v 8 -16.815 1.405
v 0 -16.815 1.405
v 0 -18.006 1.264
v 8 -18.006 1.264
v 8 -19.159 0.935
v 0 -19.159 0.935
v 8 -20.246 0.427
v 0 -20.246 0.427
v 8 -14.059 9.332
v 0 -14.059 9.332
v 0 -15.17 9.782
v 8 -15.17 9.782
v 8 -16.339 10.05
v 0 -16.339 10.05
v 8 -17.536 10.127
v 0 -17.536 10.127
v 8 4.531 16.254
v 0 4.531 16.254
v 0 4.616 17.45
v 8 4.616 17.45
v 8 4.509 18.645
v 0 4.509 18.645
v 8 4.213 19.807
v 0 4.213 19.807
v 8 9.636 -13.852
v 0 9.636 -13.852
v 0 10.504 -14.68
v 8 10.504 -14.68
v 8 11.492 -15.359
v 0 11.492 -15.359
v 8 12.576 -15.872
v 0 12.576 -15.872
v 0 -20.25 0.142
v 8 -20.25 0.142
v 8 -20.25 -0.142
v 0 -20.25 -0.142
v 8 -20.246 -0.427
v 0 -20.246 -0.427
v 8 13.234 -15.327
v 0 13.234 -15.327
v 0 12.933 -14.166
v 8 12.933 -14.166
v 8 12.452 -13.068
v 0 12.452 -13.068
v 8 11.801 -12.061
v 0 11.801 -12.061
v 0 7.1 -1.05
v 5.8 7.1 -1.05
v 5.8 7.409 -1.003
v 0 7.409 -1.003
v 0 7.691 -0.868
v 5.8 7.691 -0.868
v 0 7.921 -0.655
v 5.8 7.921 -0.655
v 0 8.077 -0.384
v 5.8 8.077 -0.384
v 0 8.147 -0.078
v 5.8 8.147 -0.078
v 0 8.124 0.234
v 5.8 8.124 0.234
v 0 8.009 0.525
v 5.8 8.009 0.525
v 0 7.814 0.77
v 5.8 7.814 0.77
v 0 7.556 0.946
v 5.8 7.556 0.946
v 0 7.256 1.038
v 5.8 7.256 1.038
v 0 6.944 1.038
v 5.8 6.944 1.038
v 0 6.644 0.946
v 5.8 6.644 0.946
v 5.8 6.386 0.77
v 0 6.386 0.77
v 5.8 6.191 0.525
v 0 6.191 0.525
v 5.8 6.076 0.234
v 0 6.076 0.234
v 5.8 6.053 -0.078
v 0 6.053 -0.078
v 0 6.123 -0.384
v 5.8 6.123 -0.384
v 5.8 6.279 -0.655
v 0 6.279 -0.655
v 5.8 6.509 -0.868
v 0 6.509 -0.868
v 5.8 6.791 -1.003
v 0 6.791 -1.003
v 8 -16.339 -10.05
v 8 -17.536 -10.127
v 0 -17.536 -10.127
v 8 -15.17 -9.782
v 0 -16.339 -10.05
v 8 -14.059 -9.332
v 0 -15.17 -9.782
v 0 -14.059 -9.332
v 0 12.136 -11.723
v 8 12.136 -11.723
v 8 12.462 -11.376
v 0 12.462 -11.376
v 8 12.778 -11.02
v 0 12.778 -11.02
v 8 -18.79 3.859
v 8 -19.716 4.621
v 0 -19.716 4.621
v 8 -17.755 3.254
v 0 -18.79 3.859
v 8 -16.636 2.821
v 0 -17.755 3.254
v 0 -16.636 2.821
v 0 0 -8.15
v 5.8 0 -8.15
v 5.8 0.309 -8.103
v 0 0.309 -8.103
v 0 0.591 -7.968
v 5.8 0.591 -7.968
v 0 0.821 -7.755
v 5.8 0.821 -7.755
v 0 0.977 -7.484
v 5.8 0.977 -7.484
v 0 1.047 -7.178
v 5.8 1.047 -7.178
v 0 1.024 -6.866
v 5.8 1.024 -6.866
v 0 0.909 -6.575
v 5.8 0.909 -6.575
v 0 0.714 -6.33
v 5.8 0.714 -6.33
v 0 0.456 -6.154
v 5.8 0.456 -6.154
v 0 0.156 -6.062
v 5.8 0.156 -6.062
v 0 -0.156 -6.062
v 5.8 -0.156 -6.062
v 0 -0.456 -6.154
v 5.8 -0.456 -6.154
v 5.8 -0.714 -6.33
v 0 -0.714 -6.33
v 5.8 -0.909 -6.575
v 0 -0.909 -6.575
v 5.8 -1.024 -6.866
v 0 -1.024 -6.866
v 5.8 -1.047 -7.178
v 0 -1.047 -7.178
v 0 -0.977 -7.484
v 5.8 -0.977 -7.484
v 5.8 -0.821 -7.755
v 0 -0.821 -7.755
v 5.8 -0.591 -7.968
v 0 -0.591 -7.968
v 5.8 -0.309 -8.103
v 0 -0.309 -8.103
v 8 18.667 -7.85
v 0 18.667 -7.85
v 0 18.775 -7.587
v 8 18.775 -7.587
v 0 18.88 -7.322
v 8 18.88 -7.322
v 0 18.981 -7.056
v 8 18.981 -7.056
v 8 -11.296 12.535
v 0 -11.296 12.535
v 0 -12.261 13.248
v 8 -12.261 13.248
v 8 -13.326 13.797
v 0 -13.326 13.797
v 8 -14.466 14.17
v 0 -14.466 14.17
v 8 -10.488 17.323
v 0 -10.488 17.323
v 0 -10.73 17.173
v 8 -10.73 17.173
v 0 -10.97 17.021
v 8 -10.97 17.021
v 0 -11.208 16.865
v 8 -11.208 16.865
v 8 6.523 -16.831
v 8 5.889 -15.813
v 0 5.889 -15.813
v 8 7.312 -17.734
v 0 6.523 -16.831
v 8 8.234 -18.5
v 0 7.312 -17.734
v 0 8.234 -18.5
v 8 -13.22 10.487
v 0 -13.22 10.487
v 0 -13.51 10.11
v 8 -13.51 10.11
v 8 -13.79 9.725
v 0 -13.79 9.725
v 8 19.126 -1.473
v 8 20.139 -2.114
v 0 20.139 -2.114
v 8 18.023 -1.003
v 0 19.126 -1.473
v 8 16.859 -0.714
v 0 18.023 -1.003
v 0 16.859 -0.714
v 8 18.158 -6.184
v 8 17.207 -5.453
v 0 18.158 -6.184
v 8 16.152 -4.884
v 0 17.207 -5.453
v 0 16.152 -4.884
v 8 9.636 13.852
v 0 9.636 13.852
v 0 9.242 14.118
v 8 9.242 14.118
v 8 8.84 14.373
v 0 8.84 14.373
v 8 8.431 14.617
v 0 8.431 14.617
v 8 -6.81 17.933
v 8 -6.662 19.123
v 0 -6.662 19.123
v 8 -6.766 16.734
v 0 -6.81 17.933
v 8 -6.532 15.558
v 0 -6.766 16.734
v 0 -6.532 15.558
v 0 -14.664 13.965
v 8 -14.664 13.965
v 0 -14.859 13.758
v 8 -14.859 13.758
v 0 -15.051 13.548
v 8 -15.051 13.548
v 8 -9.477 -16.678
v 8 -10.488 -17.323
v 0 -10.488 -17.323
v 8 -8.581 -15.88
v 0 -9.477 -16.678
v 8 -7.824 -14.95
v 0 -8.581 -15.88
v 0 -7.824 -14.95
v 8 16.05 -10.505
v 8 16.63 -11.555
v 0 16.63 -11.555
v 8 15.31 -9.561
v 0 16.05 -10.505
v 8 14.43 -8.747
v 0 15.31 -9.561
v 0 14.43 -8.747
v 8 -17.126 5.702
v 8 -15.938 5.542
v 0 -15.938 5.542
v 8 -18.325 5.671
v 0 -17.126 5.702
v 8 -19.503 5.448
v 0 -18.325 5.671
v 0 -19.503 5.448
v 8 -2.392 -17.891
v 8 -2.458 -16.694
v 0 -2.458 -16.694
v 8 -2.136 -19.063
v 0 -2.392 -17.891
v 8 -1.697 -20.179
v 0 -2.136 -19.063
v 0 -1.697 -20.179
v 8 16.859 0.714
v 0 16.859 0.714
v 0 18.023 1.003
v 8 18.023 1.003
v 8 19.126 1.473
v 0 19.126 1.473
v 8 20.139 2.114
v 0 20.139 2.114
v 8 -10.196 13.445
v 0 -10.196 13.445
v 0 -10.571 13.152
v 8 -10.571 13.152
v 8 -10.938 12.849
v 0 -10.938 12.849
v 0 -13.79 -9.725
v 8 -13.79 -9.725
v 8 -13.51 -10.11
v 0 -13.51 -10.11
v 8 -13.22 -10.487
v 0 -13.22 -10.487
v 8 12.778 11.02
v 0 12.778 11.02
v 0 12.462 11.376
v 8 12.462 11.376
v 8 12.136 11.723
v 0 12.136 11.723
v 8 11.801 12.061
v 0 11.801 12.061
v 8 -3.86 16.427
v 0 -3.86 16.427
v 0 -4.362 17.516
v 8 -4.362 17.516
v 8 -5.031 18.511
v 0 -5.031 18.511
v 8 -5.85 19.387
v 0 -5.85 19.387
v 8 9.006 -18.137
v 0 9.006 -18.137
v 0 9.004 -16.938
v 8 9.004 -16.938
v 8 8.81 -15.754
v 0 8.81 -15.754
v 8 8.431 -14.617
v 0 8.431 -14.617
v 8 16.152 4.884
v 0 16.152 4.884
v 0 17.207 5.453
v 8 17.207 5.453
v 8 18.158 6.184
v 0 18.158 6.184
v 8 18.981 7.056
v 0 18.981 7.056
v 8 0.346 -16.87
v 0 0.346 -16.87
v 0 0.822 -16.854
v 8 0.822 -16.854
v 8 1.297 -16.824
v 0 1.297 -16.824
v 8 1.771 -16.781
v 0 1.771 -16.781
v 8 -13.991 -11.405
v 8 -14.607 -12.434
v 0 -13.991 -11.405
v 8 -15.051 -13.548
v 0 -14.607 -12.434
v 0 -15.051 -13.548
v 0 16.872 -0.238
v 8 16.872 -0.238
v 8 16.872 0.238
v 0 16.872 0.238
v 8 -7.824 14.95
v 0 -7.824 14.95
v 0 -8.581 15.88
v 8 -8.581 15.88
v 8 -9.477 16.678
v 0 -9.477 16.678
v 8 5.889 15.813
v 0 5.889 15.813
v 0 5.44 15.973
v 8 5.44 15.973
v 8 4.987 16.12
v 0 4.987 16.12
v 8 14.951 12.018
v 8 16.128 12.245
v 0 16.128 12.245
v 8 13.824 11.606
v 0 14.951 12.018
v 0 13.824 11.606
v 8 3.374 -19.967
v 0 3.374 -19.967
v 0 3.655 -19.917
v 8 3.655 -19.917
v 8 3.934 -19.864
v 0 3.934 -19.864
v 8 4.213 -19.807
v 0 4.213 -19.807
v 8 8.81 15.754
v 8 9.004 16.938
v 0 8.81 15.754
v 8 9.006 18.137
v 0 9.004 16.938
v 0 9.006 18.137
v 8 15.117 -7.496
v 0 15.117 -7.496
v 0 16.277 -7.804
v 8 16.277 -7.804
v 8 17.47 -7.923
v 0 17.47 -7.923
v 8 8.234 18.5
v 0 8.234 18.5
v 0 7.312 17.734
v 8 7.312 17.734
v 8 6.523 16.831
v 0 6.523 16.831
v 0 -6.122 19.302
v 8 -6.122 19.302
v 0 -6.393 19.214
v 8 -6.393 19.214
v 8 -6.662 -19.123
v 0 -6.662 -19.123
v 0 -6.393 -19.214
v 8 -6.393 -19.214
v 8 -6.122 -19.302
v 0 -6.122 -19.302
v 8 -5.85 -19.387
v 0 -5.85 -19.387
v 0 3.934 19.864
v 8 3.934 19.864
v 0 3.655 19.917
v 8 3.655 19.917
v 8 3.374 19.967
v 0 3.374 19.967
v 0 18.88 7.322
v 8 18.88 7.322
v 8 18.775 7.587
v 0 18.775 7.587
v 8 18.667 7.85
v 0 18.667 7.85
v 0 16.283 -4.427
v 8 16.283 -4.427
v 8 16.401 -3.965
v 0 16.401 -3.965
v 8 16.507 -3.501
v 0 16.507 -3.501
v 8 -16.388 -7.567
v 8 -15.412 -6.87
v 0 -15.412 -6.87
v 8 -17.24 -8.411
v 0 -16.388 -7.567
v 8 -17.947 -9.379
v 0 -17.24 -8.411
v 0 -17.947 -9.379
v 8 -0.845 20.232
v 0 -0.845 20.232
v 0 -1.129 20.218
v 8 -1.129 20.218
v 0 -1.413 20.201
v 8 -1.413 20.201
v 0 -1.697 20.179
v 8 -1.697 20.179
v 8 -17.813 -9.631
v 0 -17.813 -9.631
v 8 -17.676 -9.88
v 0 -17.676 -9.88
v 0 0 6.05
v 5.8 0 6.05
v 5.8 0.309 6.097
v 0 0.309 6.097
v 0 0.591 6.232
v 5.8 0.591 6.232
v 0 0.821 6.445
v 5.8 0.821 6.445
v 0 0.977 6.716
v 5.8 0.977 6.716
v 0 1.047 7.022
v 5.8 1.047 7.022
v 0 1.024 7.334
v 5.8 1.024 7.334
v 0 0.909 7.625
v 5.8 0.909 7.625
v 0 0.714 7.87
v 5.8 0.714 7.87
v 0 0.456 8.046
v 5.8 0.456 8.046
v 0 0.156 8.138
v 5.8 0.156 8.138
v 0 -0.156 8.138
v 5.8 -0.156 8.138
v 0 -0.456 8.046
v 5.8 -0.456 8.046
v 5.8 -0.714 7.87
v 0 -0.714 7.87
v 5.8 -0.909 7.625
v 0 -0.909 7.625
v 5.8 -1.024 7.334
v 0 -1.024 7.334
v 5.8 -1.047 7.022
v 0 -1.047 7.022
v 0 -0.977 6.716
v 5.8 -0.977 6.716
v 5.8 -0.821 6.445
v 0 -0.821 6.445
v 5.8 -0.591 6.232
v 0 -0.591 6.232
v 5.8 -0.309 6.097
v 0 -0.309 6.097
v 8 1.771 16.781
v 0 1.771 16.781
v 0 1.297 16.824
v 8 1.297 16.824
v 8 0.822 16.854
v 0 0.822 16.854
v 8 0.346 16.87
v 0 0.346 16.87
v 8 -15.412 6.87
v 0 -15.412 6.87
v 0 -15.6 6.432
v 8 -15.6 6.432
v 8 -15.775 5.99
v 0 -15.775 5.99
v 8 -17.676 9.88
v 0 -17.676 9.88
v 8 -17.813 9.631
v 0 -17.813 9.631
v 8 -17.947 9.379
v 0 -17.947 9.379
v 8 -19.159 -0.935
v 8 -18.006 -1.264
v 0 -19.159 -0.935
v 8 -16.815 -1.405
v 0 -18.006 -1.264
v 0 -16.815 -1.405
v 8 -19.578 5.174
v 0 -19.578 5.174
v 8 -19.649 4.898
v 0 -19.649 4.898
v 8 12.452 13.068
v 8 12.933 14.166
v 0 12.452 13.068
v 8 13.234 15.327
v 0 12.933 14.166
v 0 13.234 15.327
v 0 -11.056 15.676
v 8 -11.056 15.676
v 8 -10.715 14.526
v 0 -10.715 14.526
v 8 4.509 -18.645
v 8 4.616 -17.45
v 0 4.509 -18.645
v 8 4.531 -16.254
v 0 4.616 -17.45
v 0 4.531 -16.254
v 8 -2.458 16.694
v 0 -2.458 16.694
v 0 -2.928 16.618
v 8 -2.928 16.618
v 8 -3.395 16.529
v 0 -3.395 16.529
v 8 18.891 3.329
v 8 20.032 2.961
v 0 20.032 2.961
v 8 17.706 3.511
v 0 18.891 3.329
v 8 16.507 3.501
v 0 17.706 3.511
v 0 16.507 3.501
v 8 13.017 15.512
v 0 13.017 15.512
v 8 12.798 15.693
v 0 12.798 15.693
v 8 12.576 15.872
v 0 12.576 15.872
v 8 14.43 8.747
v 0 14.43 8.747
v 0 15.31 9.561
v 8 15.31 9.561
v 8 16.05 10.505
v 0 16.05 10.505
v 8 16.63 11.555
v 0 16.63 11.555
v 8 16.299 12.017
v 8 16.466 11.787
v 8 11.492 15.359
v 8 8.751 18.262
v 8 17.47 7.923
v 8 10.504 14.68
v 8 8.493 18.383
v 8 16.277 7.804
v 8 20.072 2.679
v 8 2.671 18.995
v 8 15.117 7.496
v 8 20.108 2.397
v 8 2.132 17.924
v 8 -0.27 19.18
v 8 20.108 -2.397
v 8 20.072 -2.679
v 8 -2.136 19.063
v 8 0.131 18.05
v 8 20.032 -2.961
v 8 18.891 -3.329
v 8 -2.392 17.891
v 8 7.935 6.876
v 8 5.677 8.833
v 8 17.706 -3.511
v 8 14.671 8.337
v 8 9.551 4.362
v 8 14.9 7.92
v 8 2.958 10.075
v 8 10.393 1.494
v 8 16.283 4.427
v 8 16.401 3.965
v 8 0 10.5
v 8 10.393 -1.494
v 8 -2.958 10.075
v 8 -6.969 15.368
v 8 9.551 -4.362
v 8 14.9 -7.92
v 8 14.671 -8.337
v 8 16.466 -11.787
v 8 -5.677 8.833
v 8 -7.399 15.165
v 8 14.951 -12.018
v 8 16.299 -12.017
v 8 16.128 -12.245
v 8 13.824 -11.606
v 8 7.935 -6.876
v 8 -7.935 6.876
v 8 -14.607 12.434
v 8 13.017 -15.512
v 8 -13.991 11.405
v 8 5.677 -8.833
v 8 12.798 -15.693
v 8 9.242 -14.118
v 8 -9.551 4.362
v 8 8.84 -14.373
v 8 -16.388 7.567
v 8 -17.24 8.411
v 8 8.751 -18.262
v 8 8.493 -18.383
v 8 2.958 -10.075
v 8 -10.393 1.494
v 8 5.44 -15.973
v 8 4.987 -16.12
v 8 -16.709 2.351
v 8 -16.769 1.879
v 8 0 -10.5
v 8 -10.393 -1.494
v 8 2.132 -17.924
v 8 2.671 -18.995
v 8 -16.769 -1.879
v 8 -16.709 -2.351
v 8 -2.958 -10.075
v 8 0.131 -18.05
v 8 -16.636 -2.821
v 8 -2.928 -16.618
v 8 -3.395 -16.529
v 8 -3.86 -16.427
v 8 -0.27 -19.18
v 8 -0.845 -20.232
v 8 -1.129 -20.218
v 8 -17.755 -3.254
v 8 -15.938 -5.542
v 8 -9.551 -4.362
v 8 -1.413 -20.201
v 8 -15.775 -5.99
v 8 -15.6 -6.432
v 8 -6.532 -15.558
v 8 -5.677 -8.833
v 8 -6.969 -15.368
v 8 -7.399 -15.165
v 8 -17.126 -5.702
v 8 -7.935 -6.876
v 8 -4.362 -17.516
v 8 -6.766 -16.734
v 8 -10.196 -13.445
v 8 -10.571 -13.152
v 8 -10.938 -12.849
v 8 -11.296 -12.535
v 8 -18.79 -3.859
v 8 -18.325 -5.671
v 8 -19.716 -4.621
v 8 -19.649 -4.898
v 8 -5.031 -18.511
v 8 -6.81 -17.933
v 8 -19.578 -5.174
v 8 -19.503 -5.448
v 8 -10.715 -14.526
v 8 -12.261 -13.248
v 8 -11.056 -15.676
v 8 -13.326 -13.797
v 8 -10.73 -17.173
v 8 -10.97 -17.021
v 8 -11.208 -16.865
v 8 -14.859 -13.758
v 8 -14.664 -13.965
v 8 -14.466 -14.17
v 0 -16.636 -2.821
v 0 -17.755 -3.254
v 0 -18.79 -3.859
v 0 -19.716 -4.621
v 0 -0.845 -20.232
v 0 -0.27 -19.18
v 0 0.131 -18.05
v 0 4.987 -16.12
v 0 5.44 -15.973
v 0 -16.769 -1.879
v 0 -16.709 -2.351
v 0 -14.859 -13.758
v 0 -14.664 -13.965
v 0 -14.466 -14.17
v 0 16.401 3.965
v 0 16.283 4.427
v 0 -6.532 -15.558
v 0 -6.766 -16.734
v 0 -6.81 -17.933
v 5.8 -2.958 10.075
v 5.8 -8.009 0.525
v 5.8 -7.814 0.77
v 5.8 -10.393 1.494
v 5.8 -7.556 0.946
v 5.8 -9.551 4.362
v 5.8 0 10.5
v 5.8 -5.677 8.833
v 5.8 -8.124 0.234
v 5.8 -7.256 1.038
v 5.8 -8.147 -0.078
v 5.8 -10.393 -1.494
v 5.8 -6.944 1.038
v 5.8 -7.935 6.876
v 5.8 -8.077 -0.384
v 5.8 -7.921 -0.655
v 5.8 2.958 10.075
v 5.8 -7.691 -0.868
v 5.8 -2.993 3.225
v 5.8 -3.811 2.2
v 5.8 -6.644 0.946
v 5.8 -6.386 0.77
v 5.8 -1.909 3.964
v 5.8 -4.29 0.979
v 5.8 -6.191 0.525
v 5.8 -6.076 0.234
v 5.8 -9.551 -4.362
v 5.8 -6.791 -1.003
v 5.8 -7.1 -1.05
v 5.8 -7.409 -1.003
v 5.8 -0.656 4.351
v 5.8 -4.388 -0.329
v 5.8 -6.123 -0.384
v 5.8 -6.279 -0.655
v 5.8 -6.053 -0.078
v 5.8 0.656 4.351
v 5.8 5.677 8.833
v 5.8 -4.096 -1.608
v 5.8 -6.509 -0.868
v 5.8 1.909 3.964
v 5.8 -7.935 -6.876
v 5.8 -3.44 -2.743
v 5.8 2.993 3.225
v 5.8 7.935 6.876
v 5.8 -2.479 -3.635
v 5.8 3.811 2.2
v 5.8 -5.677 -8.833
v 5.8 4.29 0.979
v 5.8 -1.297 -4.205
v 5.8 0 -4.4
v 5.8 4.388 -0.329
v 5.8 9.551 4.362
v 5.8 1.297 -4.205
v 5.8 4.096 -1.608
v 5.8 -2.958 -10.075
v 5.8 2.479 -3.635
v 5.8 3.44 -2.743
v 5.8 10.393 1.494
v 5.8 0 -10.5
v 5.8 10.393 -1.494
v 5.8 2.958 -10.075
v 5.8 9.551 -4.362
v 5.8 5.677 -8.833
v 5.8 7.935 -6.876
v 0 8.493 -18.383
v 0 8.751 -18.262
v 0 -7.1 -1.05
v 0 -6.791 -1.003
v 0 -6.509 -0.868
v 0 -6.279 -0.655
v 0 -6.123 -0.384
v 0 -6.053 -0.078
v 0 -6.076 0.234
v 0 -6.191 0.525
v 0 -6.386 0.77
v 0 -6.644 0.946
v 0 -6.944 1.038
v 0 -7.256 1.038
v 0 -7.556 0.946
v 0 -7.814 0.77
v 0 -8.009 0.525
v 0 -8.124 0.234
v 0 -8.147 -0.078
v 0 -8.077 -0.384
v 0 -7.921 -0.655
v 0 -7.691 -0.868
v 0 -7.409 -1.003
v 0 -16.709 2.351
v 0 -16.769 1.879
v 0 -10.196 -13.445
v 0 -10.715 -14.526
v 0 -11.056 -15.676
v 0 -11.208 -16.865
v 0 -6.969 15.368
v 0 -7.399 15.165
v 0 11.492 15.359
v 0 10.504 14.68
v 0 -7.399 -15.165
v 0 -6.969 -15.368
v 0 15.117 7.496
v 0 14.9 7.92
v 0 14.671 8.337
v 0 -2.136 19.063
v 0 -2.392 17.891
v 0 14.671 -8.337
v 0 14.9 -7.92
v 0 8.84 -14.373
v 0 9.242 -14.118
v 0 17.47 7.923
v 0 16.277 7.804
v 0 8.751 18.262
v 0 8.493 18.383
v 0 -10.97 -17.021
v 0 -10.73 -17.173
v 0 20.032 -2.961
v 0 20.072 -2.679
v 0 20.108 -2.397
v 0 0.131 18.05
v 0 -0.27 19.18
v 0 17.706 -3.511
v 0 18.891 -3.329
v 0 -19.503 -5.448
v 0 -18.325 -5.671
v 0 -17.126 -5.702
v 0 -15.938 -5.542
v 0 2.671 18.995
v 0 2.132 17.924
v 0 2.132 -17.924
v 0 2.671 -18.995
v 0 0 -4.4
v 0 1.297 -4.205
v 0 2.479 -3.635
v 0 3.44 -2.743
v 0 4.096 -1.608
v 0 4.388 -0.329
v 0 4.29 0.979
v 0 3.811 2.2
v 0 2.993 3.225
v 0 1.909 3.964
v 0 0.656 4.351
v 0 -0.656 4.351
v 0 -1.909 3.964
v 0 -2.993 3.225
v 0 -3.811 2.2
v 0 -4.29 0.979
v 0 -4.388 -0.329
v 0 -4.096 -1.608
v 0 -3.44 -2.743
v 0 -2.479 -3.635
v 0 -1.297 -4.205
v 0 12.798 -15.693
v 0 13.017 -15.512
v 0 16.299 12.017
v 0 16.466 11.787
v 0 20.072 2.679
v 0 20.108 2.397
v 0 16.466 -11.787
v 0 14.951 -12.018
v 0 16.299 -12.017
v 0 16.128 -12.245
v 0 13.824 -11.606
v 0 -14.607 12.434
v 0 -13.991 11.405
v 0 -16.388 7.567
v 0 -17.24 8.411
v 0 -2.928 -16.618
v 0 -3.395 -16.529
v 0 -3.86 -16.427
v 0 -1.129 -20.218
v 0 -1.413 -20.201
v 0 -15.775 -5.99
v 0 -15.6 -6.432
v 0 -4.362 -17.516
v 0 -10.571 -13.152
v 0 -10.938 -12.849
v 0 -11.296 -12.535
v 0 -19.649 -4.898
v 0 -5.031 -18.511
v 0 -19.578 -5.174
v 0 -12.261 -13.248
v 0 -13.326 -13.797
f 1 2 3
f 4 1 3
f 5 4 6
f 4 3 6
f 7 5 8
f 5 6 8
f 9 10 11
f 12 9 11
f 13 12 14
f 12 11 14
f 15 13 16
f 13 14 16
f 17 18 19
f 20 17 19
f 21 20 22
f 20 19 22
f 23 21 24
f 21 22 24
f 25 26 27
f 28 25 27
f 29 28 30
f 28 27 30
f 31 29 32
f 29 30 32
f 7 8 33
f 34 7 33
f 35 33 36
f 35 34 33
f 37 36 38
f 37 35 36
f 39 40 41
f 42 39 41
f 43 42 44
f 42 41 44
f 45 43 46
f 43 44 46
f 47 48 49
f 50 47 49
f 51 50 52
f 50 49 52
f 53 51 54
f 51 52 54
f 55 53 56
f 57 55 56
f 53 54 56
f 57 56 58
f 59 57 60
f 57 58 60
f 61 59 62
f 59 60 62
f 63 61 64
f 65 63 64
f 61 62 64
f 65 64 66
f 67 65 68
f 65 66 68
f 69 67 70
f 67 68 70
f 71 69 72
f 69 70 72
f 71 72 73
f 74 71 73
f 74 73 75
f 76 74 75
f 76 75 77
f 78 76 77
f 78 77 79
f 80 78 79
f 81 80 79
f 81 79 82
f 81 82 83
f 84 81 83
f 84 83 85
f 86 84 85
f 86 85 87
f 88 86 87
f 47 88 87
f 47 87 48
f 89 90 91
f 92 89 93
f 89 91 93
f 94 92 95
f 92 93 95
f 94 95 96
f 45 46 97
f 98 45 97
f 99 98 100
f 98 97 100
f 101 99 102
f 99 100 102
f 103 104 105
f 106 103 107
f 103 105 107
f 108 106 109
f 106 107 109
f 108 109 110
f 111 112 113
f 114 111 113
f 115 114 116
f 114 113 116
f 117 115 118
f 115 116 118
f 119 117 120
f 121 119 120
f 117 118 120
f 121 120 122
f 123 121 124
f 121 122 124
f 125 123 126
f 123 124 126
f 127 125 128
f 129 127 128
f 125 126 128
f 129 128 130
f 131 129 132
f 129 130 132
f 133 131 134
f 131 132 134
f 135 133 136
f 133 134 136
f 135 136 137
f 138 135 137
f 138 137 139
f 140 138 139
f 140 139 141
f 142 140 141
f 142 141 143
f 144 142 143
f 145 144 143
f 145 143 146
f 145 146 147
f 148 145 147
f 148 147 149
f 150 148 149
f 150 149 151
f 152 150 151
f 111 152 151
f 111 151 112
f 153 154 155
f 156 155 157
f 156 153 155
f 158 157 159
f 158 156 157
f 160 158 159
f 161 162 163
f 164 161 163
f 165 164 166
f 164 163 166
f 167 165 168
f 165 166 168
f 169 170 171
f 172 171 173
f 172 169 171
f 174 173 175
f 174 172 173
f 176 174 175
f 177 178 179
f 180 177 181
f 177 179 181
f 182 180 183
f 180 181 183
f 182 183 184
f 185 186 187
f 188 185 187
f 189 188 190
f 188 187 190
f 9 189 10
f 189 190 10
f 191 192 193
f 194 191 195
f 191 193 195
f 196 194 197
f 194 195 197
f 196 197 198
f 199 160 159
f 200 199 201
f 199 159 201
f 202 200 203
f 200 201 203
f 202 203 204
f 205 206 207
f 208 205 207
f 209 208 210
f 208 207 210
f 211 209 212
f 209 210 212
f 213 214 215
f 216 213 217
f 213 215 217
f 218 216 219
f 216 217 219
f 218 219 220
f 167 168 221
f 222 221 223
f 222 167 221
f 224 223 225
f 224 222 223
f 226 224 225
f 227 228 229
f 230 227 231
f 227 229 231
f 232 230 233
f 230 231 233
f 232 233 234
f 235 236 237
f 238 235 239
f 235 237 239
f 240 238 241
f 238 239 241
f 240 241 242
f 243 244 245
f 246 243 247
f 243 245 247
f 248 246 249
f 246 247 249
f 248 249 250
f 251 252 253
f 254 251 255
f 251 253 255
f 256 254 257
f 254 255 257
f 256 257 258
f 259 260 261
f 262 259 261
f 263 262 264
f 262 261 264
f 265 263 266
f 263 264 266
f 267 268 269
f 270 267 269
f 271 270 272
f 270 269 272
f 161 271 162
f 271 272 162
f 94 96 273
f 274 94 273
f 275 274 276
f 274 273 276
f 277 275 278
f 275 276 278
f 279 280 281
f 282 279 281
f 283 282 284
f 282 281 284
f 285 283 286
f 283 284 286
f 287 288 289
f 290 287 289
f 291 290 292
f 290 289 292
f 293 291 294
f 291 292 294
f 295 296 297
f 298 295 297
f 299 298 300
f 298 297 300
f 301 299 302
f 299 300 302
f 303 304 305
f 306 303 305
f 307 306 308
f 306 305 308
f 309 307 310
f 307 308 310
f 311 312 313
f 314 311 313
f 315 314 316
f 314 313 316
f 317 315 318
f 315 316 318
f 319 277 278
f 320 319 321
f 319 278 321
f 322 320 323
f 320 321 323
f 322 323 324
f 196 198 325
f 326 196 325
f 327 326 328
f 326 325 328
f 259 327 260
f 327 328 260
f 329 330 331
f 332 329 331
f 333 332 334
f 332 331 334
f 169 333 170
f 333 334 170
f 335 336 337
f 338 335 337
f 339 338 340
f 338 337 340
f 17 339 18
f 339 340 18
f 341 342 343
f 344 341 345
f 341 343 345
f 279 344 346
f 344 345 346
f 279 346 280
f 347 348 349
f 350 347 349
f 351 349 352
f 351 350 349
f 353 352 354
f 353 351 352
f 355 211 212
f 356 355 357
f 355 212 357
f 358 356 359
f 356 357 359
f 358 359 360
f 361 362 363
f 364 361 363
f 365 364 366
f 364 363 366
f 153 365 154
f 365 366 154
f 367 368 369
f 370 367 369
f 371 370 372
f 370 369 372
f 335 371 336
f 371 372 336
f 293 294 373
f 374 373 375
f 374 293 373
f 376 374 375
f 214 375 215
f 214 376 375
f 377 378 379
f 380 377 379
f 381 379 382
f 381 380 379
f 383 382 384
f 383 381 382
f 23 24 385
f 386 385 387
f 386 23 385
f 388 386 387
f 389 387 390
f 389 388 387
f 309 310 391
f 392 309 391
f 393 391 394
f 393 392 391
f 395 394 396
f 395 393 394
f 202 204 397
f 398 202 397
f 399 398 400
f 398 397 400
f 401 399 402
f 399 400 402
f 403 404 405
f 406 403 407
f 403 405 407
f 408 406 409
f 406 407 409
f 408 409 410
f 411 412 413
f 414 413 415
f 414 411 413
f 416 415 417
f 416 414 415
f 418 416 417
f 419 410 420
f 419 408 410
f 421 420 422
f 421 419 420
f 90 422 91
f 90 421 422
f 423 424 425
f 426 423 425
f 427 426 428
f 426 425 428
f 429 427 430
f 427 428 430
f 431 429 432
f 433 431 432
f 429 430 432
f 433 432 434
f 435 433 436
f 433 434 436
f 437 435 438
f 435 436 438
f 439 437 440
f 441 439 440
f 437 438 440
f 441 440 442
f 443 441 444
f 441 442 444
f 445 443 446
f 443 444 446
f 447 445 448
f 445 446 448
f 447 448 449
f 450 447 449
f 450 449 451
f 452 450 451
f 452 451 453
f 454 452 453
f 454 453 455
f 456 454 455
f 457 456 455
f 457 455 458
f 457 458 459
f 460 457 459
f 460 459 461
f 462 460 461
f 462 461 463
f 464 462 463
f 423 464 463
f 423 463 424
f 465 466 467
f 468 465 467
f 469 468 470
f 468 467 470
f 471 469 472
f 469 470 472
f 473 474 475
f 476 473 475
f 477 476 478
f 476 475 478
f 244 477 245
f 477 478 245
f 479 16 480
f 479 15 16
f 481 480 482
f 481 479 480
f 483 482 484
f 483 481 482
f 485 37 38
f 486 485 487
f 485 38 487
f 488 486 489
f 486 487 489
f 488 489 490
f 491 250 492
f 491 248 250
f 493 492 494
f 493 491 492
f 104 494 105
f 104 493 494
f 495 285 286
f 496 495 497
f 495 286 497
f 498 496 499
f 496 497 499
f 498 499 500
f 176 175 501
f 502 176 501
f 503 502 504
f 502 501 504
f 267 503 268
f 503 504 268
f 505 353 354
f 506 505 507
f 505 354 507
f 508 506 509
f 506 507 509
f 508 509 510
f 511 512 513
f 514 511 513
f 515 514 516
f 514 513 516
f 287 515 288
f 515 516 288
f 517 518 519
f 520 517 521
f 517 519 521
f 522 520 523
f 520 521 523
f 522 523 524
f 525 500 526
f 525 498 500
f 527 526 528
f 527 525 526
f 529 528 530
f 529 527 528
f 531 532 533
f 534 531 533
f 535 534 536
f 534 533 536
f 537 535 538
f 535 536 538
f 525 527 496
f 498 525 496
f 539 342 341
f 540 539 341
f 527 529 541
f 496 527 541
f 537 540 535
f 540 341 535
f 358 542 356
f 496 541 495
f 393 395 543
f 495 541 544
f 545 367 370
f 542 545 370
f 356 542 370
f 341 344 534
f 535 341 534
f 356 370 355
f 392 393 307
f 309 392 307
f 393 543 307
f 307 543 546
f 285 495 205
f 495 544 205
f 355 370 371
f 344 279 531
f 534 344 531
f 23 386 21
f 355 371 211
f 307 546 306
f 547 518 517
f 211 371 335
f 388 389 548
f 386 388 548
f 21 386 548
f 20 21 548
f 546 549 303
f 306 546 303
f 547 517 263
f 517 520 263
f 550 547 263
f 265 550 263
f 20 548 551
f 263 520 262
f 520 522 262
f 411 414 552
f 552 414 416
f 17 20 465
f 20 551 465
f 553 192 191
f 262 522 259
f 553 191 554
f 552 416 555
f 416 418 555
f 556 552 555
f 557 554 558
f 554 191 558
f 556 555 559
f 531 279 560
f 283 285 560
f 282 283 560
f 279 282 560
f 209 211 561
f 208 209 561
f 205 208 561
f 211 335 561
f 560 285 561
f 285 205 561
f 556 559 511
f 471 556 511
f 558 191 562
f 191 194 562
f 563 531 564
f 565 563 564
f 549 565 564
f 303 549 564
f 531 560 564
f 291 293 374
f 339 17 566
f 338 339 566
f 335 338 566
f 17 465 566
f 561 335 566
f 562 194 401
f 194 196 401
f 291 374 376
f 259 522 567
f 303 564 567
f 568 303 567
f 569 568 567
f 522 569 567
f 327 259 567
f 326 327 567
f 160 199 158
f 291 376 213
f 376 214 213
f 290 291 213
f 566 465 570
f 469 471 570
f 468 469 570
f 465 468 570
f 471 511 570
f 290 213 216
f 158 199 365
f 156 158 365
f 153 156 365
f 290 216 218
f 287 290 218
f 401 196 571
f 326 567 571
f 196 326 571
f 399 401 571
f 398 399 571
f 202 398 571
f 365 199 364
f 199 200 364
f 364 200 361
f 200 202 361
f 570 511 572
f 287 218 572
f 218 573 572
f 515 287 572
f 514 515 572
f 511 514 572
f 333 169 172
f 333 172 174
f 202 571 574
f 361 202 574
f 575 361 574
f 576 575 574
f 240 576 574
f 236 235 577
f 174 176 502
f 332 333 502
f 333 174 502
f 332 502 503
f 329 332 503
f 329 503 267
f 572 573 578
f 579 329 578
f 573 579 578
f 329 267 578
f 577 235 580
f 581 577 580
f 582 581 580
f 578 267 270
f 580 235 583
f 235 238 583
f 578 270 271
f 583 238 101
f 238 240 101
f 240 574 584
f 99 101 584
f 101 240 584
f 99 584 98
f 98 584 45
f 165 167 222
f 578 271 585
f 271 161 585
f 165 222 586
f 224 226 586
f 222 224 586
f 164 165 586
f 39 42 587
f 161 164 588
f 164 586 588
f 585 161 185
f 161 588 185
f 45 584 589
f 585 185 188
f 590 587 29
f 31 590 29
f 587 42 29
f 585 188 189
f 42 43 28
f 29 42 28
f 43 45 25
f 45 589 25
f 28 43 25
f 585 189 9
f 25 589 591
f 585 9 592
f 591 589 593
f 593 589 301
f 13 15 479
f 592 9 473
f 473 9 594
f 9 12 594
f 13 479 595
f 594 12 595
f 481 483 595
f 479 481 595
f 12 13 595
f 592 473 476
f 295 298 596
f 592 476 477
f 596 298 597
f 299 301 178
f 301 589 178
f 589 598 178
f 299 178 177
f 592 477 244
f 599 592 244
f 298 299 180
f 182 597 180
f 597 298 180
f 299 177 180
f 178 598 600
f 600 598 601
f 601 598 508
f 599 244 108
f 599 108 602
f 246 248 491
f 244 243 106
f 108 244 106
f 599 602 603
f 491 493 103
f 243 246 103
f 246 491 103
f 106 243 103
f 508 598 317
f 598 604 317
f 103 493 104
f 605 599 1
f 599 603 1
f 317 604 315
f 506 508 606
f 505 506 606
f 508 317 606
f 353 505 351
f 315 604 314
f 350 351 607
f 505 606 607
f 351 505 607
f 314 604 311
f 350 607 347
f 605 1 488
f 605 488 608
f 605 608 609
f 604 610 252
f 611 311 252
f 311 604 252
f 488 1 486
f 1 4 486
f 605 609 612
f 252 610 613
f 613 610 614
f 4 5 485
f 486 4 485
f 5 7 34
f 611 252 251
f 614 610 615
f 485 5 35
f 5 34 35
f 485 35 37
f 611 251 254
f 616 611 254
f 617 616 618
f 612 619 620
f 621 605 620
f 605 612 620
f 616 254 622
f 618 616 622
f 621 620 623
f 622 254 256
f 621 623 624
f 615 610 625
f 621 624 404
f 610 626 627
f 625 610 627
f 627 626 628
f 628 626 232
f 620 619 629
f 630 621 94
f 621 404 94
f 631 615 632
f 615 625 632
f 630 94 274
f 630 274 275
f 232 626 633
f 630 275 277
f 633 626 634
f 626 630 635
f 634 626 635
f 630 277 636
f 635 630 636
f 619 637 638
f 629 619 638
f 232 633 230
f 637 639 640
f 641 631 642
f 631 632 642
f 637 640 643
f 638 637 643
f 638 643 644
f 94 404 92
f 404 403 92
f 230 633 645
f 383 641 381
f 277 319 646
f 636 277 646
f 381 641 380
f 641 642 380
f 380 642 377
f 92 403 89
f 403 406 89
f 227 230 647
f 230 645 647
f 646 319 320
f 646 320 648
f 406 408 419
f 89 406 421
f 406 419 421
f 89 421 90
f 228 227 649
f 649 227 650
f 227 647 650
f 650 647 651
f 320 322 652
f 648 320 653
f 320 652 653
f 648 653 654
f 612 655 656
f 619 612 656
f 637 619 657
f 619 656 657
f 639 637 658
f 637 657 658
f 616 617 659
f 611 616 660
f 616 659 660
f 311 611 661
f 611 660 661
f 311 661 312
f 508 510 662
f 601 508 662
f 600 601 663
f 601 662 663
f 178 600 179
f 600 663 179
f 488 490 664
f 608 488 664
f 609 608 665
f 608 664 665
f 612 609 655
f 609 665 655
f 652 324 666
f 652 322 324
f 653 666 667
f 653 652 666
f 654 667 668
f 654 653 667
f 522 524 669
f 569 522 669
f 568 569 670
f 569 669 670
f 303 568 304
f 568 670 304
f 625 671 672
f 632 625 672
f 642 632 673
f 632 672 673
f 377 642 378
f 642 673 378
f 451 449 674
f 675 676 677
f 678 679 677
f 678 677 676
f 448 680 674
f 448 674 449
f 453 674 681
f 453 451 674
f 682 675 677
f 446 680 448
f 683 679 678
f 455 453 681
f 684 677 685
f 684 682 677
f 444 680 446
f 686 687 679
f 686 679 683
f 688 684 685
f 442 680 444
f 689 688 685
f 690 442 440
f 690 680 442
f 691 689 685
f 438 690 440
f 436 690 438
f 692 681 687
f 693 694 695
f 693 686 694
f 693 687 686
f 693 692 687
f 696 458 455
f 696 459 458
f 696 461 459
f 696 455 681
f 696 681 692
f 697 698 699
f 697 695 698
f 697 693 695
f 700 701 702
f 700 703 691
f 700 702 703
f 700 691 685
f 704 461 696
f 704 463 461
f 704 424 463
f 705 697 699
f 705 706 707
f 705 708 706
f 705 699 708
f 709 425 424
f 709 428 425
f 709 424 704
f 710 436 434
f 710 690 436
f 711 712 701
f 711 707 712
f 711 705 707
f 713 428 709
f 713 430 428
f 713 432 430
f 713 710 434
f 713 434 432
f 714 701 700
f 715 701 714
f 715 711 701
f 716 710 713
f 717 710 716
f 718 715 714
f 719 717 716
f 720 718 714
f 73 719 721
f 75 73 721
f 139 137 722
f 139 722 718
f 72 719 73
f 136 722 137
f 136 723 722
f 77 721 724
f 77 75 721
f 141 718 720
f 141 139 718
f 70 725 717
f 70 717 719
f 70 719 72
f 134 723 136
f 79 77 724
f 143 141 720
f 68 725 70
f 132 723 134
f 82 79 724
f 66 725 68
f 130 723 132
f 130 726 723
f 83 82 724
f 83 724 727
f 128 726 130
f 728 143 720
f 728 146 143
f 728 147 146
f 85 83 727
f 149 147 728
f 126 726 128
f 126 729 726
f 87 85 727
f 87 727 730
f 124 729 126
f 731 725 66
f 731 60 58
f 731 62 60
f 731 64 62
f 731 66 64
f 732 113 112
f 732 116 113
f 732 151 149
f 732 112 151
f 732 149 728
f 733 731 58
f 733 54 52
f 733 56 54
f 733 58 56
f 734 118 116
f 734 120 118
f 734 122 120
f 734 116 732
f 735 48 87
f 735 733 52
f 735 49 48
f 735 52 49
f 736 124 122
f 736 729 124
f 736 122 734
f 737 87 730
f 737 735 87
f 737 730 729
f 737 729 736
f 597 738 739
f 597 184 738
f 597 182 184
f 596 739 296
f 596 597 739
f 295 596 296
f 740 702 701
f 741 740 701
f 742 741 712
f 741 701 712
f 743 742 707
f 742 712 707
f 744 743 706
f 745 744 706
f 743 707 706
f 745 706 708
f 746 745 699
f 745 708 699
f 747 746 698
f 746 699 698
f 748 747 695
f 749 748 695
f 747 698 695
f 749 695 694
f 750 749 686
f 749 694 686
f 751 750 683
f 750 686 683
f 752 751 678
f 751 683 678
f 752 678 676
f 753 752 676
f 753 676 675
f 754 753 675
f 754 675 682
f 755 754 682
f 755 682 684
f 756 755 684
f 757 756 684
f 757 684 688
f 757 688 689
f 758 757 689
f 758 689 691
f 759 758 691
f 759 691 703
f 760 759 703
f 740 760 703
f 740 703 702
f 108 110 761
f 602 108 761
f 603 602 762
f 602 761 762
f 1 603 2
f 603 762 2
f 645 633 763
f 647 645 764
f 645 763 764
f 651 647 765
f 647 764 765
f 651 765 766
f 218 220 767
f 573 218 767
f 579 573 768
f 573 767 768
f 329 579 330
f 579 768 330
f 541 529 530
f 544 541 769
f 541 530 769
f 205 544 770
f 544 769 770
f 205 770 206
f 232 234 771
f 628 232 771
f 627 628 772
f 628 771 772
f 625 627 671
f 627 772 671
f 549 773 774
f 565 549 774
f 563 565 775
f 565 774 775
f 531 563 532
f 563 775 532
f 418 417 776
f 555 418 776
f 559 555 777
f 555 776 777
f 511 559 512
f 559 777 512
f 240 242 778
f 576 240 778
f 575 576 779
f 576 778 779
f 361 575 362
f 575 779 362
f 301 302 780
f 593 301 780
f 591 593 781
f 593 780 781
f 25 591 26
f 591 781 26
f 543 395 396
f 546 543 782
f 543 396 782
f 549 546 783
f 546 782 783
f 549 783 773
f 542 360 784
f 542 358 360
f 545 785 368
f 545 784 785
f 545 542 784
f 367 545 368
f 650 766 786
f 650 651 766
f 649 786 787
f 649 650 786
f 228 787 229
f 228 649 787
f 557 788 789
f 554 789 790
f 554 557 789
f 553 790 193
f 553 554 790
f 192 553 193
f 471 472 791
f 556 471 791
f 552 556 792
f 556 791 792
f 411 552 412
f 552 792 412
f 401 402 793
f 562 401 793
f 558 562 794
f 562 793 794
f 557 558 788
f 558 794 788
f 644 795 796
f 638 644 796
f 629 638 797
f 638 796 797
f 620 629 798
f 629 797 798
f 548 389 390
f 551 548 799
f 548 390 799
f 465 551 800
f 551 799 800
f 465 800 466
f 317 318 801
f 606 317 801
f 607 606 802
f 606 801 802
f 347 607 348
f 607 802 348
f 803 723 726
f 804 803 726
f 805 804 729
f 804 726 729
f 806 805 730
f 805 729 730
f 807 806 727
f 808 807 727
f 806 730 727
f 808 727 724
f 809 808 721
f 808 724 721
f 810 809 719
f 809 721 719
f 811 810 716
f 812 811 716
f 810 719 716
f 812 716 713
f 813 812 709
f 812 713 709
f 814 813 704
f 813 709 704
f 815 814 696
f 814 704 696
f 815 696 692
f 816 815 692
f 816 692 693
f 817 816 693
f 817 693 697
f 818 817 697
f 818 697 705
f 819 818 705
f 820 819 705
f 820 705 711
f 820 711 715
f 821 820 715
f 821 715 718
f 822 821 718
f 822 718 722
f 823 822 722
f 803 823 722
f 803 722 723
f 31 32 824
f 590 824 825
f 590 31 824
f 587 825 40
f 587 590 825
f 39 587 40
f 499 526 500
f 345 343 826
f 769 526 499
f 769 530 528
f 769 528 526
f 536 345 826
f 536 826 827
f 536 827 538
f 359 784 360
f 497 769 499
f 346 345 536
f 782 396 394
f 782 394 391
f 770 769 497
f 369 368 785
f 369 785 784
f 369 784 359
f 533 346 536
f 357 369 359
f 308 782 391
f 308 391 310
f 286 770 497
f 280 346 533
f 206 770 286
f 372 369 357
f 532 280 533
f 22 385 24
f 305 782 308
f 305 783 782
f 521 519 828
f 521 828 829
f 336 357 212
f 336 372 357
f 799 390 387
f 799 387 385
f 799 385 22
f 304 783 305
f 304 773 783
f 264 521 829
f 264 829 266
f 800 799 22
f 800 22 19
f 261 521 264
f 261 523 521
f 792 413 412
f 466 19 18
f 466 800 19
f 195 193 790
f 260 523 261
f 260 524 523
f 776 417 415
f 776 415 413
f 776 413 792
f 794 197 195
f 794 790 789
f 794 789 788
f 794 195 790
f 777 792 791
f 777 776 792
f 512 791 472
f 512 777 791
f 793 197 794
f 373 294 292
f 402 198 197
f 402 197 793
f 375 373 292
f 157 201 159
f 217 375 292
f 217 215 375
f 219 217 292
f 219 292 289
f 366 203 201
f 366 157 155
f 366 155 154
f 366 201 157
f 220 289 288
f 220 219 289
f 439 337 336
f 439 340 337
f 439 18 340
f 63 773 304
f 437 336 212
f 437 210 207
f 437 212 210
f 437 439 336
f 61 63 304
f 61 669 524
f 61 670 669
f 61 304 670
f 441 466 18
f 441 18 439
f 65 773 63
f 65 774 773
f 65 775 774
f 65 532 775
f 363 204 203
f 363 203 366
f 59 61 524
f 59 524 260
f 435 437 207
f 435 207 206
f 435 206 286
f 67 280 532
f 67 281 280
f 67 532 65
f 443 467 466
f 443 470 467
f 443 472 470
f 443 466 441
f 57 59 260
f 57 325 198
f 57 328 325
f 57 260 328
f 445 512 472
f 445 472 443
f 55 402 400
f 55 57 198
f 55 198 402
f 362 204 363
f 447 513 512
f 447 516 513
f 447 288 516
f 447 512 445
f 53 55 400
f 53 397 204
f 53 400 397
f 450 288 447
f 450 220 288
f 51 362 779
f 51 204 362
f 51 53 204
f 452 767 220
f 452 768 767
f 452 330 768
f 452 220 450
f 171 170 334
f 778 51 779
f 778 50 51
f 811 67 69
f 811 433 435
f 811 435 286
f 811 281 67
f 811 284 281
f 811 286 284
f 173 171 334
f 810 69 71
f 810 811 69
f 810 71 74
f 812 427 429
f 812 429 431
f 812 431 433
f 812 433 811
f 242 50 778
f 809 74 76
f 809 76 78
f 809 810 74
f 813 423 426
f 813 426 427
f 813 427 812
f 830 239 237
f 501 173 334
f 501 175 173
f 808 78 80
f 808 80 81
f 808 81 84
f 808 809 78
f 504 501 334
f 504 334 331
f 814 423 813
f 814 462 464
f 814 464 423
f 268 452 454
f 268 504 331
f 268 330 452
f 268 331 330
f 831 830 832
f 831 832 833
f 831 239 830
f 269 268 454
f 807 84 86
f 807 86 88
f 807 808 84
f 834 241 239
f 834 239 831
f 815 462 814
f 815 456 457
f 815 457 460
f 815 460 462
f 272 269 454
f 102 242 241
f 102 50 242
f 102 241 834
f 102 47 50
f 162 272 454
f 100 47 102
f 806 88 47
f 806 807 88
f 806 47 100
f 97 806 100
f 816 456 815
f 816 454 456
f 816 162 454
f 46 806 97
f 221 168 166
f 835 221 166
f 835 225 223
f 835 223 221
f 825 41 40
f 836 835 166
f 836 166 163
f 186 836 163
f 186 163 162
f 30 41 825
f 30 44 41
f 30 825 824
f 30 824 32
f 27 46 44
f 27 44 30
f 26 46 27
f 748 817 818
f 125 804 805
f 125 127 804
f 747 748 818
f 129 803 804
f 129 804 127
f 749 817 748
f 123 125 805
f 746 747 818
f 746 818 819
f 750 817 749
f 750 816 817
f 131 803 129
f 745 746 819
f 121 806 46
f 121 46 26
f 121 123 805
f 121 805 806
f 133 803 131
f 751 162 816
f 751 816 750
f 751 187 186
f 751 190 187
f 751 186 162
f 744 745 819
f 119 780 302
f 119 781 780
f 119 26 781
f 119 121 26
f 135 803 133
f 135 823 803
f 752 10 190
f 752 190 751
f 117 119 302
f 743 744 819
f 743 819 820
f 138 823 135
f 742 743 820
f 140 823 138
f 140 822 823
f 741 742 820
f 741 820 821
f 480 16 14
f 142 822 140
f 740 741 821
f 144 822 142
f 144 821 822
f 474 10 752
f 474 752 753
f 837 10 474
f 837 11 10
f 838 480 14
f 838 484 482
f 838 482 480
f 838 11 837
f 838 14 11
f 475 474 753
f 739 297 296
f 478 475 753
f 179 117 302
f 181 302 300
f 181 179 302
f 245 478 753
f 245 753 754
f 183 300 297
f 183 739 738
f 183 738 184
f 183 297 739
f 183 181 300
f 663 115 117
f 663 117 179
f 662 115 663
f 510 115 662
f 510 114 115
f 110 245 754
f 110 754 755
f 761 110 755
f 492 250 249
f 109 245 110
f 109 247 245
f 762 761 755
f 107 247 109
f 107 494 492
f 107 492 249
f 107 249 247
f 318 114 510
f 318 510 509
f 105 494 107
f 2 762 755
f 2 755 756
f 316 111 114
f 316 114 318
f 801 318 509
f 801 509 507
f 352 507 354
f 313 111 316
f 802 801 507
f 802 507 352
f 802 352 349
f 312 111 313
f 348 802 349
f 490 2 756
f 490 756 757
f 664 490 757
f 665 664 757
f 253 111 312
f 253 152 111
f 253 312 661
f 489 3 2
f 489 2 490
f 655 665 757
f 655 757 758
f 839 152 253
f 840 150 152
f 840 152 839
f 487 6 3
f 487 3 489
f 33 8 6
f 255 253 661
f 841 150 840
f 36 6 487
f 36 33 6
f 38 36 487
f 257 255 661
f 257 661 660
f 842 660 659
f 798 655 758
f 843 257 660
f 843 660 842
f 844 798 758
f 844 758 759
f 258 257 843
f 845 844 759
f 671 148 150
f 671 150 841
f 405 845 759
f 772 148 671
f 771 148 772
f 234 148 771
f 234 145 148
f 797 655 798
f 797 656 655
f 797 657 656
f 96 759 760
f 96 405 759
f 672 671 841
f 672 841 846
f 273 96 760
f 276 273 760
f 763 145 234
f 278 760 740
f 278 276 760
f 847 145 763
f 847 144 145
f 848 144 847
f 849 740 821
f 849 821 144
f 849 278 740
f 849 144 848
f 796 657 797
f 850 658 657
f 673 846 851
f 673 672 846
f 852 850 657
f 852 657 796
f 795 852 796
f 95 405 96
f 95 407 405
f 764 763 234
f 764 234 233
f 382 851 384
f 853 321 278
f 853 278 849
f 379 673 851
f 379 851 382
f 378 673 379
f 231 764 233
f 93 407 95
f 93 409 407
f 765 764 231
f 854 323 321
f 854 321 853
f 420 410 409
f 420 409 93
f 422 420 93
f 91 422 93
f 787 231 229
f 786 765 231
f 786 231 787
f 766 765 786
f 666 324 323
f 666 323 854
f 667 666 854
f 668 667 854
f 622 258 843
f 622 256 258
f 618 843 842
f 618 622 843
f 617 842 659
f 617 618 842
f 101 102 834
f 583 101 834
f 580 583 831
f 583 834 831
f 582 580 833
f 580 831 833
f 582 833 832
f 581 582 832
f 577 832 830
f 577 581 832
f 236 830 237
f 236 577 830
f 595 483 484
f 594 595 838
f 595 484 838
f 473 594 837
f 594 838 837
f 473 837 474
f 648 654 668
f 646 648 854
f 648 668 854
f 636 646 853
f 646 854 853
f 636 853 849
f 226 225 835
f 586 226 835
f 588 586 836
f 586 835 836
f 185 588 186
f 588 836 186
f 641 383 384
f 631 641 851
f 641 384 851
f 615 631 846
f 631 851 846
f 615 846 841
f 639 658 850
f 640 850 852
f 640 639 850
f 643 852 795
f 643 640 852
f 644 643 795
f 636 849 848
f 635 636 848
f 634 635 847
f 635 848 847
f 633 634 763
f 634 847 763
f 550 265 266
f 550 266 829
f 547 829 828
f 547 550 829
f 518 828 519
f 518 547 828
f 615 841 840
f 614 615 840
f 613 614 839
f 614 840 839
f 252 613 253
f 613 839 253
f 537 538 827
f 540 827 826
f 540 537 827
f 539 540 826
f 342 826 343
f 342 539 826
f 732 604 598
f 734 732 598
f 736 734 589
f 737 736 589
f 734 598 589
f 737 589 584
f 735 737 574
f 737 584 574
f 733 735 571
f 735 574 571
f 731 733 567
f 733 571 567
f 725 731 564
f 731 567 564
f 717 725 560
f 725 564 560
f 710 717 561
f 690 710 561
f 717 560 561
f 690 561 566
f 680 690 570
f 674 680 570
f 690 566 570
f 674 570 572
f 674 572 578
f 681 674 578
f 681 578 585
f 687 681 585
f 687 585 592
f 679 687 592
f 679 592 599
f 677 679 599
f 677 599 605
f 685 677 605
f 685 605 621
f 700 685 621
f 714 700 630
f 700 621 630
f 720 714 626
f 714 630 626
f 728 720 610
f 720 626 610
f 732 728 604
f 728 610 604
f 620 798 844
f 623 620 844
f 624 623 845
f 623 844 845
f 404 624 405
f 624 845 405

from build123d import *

# Parameters (mm, degrees)
BASPROSKE_W         = 8
BASPROSKE_H         = 20.25
TOOTHCUT_DEPTH      = 30.734239523
TEETHCUTS_COUNT     = 25
TEETHCUTS_ANGLE     = 345.6
BORSKE_R            = 0.5
BORE_DEPTH          = 50.0000508
SKETCH_1_R          = 10.5
CUT_EXTRUDE_1_DEPTH = 2.2
SKETCH_2_R          = 4.4
SKETCH_2_R_2        = 1.05
CUT_EXTRUDE_2_DEPTH = 30.207030593


with BuildPart() as part:
    # BasProSke → Base-Revolve (revolve)
    with BuildSketch(Plane(origin=(0, 0, 0), x_dir=(1, 0, 0), z_dir=(0, 1, 0))):
        with Locations((4, 10.125)):
            Rectangle(BASPROSKE_W, BASPROSKE_H)
    revolve(axis=Axis((-10, 0, 0), (1, 0, 0)))

    # TooCutSke → ToothCut (cut, through all)
    with BuildSketch(Plane(origin=(0, 0, 0), x_dir=(0, 0, -1), z_dir=(1, 0, 0))):
        with BuildLine():
            ThreePointArc((0.713909619, 16.858891098), (0, 16.874), (-0.713909619, 16.858891098))
            ThreePointArc((-0.713909619, 16.858891098), (-1.221902209, 18.597177626), (-2.131751691, 20.163022588))
            ThreePointArc((-2.131751691, 20.163022588), (0, 20.2754), (2.131751691, 20.163022588))
            ThreePointArc((2.131751691, 20.163022588), (1.221902209, 18.597177626), (0.713909619, 16.858891098))
        make_face()
    toothcut = extrude(amount=TOOTHCUT_DEPTH, mode=Mode.SUBTRACT)

    # TeethCuts: ToothCut ×25 about axis
    teethcuts_axis = Axis((-10, 0, 0), (1, 0, 0))
    for i in range(1, TEETHCUTS_COUNT):
        add(toothcut.rotate(teethcuts_axis, i * TEETHCUTS_ANGLE / (TEETHCUTS_COUNT - 1)), mode=Mode.SUBTRACT)

    # BorSke → Bore (cut, symmetric)
    with BuildSketch(Plane(origin=(0, 0, 0), x_dir=(0, 0, -1), z_dir=(1, 0, 0))):
        Circle(BORSKE_R)
    extrude(amount=BORE_DEPTH, both=True, mode=Mode.SUBTRACT)

    # 草图1 → 切除-拉伸1 (cut)
    with BuildSketch(Plane(origin=(8, 0, 0), x_dir=(0, 0, -1), z_dir=(1, 0, 0))):
        Circle(SKETCH_1_R)
    extrude(amount=-CUT_EXTRUDE_1_DEPTH, mode=Mode.SUBTRACT)

    # 草图2 → 切除-拉伸2 (cut, through all)
    with BuildSketch(Plane(origin=(5.8, 0, 0), x_dir=(0, 0, -1), z_dir=(1, 0, 0))):
        Circle(SKETCH_2_R)
        with Locations((0, 7.1)):
            Circle(SKETCH_2_R_2)
        with Locations((7.1, 0)):
            Circle(SKETCH_2_R_2)
        with Locations((0, -7.1)):
            Circle(SKETCH_2_R_2)
        with Locations((-7.1, 0)):
            Circle(SKETCH_2_R_2)
    extrude(amount=-CUT_EXTRUDE_2_DEPTH, mode=Mode.SUBTRACT)


solid = part.part
